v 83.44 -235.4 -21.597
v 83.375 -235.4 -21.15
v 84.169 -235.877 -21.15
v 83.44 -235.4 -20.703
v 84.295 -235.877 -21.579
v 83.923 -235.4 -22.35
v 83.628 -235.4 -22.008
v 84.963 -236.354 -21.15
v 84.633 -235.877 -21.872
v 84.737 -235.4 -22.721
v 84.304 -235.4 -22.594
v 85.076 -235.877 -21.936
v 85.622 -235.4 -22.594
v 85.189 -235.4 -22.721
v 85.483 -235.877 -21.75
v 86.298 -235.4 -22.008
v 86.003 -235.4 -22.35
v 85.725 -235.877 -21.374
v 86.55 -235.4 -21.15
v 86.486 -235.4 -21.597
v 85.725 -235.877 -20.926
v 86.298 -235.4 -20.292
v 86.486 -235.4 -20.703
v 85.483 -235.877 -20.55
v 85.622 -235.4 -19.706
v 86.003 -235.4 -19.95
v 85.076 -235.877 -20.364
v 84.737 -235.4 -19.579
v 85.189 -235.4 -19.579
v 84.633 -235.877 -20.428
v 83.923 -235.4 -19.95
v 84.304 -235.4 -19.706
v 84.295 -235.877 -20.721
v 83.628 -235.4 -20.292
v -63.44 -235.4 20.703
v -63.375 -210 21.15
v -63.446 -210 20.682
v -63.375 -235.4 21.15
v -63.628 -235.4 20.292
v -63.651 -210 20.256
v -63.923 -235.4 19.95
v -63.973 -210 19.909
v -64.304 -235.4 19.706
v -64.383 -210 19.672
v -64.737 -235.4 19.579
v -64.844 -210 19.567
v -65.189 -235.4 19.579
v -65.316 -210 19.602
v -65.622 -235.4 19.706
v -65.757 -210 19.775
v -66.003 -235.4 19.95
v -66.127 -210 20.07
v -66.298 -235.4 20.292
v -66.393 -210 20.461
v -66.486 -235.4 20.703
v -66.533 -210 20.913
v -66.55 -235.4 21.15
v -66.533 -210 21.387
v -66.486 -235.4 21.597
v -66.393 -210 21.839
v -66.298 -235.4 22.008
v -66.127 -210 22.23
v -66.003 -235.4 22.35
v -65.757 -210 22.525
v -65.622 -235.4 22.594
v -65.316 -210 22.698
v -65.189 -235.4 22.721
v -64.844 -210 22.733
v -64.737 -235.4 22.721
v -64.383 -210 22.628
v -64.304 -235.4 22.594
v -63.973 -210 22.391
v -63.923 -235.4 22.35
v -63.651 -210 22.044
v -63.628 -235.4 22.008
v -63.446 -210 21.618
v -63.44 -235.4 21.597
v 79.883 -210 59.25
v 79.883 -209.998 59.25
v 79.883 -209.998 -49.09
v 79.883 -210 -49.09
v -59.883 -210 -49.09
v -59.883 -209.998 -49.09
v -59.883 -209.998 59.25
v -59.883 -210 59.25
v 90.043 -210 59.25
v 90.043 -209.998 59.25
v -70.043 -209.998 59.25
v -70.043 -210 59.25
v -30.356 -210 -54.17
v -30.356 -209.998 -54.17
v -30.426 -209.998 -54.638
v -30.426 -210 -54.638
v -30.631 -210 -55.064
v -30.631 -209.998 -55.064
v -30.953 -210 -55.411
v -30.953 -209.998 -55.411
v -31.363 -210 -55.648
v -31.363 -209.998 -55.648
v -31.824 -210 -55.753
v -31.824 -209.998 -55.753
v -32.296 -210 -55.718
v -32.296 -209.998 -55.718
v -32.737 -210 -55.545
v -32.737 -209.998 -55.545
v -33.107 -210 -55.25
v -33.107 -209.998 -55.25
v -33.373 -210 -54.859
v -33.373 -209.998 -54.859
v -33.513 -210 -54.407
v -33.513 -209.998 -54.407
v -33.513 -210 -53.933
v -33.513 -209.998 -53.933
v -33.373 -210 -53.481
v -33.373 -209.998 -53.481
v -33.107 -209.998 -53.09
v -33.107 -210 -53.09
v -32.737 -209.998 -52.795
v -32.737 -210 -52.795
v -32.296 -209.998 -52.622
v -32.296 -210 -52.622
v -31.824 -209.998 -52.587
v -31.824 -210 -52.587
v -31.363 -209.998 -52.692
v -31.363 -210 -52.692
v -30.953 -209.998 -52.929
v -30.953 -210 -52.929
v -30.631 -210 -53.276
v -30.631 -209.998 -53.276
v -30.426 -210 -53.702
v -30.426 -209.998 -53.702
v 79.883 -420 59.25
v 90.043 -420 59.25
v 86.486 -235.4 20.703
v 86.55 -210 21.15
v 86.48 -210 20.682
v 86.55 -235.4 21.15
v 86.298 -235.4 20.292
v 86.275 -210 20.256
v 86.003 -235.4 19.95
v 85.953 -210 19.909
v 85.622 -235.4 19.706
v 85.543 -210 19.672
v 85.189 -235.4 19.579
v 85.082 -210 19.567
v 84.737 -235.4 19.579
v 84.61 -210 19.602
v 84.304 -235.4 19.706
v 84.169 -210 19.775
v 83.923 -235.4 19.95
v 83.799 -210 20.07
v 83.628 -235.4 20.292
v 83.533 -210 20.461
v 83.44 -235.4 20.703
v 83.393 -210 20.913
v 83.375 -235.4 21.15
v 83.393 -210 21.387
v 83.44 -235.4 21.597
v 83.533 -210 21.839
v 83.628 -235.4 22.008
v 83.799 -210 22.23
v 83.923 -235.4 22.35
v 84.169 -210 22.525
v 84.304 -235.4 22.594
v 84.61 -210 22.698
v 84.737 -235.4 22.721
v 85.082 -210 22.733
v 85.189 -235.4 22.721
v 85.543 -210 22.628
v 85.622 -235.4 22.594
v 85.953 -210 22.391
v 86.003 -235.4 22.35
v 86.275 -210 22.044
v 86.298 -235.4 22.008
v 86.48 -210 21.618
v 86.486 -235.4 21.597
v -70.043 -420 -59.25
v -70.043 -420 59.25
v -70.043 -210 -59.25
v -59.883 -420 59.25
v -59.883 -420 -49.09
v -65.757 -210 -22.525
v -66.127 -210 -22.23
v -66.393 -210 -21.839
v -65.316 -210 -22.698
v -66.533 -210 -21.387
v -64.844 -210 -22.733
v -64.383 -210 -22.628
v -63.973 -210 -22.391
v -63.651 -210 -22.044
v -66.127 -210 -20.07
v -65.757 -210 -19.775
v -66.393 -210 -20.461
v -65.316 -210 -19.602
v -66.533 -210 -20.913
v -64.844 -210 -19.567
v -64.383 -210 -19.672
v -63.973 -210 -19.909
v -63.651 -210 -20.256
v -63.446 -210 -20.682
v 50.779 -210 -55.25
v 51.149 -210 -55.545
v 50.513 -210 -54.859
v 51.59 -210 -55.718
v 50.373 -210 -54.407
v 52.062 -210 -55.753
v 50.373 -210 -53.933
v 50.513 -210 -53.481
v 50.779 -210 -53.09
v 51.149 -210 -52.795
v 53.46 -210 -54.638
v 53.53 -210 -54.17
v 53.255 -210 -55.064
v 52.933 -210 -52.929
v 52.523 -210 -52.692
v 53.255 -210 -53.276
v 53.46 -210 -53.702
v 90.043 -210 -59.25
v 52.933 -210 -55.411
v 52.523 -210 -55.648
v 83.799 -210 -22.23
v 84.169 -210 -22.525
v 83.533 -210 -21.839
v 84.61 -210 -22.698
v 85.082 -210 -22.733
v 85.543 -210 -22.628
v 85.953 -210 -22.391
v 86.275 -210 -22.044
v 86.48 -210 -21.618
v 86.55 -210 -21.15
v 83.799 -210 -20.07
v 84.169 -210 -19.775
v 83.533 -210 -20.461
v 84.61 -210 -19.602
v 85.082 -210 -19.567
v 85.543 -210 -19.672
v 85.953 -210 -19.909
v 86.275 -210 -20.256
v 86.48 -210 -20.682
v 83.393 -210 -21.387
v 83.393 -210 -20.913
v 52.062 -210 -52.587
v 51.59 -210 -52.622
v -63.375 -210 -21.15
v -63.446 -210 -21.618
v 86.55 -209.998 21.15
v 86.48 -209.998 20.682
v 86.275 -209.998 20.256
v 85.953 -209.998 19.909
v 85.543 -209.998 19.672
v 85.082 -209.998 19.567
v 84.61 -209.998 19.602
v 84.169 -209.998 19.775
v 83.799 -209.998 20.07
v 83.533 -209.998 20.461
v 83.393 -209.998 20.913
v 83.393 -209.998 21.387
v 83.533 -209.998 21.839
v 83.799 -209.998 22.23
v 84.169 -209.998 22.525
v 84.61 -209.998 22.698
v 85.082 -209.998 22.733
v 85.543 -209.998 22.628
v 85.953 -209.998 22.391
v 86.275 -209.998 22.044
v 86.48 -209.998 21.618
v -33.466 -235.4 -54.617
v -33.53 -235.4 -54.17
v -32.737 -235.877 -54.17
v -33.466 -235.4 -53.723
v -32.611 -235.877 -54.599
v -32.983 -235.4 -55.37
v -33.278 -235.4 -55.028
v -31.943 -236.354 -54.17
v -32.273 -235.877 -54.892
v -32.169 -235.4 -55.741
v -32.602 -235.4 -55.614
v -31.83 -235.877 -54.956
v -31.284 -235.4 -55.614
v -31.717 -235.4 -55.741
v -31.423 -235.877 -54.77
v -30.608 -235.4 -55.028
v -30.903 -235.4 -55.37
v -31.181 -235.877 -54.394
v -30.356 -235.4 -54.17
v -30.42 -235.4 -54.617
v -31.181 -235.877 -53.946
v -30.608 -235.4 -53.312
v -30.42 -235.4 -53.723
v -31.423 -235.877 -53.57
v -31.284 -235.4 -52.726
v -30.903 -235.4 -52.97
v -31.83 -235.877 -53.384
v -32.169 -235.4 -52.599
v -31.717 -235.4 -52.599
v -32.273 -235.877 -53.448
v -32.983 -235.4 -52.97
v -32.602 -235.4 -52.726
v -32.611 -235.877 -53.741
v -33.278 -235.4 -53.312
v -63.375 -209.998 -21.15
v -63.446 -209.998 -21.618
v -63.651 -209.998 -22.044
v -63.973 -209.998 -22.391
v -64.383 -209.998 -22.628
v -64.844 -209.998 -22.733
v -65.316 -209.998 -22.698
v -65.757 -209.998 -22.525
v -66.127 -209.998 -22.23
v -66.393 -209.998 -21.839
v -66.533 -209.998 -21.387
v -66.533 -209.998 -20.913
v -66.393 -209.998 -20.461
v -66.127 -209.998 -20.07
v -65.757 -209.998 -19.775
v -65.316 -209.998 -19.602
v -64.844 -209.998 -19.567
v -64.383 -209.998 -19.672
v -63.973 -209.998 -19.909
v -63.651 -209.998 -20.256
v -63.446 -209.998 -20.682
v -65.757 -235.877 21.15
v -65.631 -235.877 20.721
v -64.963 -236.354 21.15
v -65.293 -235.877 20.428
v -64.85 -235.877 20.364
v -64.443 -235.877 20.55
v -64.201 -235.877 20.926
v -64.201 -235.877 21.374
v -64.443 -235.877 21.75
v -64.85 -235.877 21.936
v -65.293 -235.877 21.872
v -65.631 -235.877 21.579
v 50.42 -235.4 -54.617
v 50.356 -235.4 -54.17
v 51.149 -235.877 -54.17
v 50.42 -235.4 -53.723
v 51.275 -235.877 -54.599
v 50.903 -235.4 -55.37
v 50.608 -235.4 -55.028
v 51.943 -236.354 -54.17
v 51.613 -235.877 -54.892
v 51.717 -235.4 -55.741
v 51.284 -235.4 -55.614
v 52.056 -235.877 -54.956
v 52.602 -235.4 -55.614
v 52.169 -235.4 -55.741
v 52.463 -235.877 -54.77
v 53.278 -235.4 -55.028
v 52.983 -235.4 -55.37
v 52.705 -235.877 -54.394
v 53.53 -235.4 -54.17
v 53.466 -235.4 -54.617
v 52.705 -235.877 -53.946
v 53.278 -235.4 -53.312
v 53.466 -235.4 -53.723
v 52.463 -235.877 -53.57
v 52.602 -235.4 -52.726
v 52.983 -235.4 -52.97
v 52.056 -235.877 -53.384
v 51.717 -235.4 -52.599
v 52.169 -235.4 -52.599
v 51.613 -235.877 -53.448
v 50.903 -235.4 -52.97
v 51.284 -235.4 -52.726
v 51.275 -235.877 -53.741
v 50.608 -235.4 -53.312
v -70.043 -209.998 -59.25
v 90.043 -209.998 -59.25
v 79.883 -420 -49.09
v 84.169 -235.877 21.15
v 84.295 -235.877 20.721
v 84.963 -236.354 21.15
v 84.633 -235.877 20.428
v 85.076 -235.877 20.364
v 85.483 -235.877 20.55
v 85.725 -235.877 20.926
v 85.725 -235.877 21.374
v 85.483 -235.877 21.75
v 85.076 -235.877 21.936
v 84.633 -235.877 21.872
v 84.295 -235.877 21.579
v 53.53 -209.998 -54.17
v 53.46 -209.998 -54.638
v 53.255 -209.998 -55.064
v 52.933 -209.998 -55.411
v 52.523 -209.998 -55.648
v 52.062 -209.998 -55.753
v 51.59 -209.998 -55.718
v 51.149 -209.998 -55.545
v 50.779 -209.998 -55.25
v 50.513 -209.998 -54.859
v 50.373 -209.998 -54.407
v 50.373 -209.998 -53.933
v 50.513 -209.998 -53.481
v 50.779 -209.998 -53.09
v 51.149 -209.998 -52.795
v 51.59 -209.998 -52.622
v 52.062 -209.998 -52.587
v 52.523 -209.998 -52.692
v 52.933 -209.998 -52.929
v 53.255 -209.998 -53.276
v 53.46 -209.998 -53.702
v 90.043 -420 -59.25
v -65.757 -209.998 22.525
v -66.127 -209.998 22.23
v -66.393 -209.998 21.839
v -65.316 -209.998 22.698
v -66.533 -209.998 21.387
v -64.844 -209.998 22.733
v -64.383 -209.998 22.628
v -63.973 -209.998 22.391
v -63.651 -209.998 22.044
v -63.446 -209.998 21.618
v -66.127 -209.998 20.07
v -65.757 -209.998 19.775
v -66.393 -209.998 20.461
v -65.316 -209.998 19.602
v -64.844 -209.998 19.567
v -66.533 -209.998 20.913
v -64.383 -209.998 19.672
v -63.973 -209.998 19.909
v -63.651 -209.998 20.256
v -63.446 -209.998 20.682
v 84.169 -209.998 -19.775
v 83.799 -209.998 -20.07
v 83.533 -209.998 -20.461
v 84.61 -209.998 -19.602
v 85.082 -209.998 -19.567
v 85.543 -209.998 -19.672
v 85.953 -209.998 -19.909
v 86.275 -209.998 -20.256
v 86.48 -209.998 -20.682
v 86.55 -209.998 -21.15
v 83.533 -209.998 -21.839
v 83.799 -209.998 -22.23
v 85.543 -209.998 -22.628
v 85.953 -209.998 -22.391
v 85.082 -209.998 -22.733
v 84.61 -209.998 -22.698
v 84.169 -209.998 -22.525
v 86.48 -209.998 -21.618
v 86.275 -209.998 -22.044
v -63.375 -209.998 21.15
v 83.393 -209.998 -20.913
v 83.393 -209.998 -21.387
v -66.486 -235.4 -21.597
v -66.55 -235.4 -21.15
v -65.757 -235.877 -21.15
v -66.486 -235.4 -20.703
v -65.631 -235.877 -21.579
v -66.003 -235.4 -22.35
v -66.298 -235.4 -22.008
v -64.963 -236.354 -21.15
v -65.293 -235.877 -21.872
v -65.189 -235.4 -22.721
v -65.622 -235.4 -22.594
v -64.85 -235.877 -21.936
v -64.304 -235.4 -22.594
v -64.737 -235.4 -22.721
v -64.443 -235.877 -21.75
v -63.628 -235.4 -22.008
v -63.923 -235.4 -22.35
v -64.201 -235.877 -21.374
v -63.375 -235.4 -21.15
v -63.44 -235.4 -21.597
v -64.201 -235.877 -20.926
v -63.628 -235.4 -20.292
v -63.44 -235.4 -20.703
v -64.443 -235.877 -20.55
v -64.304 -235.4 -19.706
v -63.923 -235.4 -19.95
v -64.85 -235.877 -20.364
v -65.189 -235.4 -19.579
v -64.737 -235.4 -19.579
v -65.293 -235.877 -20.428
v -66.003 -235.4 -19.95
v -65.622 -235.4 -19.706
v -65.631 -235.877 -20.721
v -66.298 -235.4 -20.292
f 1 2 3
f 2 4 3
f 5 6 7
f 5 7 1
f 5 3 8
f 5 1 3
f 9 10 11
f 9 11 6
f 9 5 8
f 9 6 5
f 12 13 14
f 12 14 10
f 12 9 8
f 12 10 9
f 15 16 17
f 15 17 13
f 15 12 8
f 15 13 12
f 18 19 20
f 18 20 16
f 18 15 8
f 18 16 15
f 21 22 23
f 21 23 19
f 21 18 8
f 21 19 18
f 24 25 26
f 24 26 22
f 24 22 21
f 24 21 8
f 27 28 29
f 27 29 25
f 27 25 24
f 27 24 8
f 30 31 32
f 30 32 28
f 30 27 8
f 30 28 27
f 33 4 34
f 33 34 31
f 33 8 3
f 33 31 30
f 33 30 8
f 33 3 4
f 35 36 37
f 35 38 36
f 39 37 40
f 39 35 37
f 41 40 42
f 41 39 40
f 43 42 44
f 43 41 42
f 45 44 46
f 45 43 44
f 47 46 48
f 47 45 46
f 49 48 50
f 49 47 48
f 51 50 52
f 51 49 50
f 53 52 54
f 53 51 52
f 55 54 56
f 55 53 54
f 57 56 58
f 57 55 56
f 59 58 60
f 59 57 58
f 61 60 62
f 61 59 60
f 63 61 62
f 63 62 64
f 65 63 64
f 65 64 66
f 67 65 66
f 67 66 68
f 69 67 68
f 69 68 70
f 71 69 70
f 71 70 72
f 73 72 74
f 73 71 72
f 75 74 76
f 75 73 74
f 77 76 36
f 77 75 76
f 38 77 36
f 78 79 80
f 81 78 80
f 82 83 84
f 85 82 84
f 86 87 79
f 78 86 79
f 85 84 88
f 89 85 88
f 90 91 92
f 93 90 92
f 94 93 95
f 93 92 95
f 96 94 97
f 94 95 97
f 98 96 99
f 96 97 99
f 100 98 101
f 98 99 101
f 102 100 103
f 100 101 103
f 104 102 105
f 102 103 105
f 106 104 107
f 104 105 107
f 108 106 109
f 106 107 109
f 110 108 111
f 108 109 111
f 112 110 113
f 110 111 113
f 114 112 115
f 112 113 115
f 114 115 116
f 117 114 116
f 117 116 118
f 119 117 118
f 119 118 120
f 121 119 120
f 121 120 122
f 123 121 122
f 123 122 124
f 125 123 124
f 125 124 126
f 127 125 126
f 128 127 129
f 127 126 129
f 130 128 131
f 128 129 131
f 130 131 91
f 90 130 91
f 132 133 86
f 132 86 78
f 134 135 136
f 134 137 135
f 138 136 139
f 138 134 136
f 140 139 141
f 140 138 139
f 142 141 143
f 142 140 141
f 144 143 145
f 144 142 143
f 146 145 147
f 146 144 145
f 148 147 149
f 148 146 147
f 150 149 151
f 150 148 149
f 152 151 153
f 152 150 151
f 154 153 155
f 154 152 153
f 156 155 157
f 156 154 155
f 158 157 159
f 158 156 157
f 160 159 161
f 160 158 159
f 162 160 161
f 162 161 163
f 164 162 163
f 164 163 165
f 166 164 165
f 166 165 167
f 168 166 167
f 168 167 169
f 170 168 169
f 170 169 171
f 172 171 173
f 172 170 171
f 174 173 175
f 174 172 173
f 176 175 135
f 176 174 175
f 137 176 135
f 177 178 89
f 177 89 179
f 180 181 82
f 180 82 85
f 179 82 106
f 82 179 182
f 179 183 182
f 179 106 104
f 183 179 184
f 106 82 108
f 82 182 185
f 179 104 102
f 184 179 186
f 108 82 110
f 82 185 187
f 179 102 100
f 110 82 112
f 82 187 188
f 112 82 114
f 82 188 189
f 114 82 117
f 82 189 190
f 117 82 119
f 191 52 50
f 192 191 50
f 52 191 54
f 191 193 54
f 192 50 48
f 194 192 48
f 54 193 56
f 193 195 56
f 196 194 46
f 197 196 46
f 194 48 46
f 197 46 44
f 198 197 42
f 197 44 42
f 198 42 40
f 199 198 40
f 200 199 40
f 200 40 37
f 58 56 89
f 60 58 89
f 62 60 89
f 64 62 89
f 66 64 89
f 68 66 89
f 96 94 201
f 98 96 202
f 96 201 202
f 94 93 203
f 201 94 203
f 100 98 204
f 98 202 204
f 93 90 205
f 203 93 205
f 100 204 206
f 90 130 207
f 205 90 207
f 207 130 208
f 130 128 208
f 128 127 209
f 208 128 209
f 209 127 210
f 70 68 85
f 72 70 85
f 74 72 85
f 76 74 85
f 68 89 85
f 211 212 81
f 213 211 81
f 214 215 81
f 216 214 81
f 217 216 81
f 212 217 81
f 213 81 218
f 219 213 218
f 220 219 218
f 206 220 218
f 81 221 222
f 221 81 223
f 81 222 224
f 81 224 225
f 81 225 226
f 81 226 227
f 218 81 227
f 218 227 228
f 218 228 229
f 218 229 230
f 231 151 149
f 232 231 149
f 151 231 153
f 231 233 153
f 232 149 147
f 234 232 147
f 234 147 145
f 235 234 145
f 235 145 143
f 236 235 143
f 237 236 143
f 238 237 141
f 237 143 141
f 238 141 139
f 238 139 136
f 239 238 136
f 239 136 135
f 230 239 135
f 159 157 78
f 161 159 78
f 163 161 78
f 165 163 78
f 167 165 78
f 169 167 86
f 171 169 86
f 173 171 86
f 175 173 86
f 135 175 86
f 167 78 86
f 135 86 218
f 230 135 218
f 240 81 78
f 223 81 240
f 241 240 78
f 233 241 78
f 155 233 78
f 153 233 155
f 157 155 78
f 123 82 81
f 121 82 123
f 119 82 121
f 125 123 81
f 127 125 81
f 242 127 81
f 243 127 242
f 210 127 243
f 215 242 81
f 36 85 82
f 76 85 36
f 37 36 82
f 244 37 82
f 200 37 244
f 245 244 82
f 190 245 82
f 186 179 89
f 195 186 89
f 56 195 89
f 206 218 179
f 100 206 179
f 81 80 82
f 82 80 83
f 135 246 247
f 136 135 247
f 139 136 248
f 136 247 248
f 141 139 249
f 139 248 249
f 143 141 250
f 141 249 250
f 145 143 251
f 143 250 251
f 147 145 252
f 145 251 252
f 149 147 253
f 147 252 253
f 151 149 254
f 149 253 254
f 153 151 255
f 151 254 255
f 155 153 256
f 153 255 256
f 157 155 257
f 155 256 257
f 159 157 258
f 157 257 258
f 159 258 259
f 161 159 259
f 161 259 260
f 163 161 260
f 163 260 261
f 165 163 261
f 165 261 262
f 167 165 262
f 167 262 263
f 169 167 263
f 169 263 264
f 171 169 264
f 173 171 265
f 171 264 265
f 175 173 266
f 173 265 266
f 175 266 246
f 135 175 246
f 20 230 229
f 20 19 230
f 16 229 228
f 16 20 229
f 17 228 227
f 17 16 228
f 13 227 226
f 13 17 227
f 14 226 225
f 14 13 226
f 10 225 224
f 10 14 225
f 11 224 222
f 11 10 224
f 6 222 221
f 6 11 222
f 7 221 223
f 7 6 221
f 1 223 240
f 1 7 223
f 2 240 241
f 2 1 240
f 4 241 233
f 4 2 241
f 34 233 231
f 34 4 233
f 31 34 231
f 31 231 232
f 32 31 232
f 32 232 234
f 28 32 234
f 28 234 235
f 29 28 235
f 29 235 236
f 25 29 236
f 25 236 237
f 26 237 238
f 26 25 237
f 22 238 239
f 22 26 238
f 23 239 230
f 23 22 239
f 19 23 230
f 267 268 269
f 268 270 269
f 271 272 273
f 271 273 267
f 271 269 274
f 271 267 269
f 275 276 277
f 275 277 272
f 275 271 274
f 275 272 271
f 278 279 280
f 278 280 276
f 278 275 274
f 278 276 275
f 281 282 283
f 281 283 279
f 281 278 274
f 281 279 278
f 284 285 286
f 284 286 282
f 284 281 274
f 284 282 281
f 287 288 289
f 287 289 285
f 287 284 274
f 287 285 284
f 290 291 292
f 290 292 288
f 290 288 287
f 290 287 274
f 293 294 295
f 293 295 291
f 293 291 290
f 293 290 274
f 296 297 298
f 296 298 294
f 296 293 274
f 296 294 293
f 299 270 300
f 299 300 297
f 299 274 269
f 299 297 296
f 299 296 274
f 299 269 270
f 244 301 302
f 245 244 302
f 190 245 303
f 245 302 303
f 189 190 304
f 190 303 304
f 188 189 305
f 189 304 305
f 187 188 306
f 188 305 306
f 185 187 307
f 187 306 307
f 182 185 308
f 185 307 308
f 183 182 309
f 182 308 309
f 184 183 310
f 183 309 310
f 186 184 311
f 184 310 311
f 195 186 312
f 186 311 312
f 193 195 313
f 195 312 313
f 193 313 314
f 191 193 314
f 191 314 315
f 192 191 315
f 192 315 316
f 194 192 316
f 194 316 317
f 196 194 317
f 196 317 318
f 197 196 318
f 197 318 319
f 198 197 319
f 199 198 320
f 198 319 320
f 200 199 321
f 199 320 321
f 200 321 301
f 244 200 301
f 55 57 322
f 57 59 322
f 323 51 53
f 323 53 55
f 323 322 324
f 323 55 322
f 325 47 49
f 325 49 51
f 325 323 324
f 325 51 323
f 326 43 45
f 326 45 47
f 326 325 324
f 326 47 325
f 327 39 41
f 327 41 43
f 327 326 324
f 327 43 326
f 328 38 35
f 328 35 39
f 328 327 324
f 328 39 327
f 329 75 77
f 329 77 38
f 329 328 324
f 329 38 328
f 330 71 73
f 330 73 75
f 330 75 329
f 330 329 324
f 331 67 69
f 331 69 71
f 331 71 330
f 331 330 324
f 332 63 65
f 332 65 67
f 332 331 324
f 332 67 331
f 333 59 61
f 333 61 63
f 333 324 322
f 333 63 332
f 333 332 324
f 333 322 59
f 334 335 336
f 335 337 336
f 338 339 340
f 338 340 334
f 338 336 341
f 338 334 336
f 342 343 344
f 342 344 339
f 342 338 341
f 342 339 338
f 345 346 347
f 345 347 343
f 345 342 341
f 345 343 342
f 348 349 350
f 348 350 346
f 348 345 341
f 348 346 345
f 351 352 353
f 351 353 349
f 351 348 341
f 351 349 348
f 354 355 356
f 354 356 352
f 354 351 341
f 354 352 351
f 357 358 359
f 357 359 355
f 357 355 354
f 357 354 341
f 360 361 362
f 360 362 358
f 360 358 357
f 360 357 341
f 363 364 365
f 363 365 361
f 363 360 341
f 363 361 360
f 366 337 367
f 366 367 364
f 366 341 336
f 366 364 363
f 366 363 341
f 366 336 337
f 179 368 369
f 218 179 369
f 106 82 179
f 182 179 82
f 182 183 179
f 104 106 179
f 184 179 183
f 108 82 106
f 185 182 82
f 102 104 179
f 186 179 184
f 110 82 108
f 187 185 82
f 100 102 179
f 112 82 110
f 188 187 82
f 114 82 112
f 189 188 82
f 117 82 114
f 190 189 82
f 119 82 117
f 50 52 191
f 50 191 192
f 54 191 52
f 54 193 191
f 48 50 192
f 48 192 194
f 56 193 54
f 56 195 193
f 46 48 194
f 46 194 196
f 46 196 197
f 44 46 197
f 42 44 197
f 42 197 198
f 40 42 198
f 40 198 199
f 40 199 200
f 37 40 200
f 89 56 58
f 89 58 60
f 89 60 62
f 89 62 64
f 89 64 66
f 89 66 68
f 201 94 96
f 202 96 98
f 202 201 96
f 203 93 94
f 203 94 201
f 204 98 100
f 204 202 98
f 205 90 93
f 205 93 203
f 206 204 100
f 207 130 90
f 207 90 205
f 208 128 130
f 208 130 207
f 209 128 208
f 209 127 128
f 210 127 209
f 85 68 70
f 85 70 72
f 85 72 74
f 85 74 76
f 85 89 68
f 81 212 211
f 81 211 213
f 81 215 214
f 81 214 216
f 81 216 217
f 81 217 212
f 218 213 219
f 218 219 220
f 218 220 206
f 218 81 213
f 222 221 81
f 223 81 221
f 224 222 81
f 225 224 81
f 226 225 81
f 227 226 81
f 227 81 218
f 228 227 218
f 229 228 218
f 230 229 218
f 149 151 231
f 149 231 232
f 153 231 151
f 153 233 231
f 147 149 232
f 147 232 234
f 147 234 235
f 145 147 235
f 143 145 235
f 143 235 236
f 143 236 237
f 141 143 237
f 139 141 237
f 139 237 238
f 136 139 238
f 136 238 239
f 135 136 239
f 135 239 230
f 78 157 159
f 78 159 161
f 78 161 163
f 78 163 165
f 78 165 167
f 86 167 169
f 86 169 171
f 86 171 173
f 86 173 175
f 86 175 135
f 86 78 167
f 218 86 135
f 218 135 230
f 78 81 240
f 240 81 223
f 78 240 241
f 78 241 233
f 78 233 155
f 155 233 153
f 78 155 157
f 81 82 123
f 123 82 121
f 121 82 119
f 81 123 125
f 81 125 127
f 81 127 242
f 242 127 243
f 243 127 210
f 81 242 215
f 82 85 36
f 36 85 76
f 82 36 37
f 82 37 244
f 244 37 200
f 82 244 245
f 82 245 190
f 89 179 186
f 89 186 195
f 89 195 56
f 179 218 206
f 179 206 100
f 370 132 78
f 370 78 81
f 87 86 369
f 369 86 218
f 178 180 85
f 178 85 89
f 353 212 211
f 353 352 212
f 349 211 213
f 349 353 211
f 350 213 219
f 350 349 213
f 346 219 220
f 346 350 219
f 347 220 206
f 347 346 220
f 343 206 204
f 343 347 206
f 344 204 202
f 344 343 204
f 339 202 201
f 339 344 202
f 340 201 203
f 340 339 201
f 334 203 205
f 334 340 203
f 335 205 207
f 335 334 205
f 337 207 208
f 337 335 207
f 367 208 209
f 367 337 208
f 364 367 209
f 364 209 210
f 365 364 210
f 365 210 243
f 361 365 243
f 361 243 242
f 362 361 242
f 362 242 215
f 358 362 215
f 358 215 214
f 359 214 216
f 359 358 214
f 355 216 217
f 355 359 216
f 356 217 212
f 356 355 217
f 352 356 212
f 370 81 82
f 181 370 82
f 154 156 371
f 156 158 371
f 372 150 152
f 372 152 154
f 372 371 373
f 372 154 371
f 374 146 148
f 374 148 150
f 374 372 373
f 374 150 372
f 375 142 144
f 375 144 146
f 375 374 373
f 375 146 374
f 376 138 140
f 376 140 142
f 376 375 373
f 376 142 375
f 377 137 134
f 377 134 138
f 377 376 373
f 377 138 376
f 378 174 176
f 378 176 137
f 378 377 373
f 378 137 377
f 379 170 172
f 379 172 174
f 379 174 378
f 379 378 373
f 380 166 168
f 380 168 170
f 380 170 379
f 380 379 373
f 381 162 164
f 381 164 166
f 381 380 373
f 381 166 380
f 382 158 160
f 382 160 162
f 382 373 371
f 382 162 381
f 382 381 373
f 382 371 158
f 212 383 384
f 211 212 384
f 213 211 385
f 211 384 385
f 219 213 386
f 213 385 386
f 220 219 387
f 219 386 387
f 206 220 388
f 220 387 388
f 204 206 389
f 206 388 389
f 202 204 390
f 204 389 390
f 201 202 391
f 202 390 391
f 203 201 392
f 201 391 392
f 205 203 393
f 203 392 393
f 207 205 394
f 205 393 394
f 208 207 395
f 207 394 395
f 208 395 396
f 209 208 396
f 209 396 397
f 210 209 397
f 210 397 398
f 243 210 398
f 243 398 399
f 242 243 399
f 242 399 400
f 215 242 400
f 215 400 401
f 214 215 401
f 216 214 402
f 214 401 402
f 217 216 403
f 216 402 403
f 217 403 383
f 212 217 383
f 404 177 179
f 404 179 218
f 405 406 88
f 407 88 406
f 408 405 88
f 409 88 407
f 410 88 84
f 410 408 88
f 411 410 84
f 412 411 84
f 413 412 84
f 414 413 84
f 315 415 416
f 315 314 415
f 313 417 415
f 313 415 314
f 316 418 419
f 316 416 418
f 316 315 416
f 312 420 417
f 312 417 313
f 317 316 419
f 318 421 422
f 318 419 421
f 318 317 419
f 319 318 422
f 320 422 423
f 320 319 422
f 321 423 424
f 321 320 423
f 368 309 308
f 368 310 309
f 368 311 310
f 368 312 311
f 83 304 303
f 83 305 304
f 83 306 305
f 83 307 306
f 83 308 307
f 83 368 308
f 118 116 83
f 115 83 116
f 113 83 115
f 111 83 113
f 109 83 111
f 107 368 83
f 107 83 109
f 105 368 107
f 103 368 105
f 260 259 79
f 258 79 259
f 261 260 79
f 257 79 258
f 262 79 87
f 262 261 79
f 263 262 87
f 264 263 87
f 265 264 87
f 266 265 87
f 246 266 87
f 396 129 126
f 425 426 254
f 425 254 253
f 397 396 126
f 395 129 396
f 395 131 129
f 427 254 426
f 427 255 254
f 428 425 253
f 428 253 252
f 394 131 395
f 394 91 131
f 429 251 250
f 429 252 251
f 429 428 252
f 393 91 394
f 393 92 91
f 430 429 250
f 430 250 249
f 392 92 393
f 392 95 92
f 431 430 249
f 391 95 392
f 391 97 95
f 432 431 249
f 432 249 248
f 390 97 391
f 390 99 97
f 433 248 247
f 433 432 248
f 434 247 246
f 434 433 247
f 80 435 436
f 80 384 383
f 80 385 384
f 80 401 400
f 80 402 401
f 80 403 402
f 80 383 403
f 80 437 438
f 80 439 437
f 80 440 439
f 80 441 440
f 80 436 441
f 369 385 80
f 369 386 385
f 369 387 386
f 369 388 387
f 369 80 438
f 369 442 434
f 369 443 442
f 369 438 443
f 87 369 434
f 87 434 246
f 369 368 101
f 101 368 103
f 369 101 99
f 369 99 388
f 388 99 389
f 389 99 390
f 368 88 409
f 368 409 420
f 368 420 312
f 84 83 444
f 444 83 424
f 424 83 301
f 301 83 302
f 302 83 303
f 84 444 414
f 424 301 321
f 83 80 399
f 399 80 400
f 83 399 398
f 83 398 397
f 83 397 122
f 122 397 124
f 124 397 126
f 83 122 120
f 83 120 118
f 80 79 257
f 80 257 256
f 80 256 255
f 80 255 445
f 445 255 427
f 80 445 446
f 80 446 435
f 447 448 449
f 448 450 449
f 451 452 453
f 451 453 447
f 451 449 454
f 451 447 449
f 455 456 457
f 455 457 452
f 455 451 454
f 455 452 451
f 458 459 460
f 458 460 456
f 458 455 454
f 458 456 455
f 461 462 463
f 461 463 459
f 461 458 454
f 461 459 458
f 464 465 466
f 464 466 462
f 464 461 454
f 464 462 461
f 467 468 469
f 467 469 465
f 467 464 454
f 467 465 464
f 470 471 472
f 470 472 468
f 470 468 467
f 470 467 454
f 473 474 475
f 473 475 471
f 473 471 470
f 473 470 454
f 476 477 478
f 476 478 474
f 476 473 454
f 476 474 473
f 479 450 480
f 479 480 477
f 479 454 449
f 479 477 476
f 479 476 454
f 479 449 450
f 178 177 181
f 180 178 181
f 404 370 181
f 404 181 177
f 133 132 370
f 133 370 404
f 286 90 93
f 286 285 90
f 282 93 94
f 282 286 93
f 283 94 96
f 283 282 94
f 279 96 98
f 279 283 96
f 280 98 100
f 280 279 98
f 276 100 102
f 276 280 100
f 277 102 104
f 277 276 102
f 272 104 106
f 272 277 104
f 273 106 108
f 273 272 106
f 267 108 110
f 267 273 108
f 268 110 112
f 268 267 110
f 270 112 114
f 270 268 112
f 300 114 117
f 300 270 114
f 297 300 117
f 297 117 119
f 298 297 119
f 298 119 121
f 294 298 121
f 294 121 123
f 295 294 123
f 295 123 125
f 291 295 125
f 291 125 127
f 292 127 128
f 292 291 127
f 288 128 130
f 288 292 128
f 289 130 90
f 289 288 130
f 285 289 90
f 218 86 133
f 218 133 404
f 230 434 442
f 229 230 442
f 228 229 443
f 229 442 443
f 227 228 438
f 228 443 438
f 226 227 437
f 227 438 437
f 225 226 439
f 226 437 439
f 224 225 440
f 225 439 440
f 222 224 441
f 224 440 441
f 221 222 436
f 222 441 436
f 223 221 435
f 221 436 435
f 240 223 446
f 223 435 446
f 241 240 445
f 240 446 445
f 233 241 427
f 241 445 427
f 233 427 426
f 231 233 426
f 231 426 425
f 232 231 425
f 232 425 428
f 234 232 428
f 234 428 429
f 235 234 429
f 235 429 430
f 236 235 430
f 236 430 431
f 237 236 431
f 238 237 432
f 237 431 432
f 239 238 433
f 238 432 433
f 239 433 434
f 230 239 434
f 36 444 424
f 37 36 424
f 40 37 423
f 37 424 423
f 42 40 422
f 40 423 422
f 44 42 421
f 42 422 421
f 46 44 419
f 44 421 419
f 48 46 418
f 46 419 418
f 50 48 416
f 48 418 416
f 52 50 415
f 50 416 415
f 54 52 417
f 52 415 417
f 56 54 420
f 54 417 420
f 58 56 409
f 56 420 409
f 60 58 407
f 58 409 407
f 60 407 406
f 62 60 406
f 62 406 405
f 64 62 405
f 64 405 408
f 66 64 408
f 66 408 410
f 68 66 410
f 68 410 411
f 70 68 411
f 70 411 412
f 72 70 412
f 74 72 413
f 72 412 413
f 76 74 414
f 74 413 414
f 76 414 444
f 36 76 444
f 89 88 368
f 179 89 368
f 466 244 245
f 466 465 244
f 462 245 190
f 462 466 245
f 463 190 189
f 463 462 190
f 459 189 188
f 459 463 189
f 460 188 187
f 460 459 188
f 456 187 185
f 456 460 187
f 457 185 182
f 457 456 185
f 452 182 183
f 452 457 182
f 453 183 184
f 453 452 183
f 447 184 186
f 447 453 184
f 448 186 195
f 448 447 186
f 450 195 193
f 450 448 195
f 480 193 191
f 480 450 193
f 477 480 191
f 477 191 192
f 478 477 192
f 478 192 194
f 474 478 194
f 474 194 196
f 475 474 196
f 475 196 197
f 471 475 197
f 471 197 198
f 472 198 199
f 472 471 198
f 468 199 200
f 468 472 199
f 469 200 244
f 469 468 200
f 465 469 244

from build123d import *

# Parameters (mm, degrees)
SKETCH1_W                      = 180.086
SKETCH1_H                      = 165.1
BOSS_EXTRUDE1_DEPTH            = 3.302
M5_CLEARANCE_HOLE2_D           = 5.5
M5_CLEARANCE_HOLE2_DEPTH       = 3.302
FILLET1_R                      = 3.302
BOSS_EXTRUDE2_DEPTH            = 210
F_1_8_0_1250_DOWEL_HOLE1_D     = 3.175
F_1_8_0_1250_DOWEL_HOLE1_DEPTH = 25.4
F_1_8_0_1250_DOWEL_HOLE1_TIP   = 0.953866233
SKETCH25_W                     = 202.106165301
SKETCH25_H                     = 177.594943489
CUT_EXTRUDE1_DEPTH             = 213.3
SKETCH26_W                     = 189.404895816
SKETCH26_H                     = 174.029674862
CUT_EXTRUDE3_DEPTH             = 3.302


with BuildPart() as part:
    # Sketch1 → Boss-Extrude1 (new body)
    with BuildSketch(Plane(origin=(0, 0, 0), x_dir=(1, 0, 0), z_dir=(0, 1, 0))):
        Rectangle(SKETCH1_W, SKETCH1_H)
    extrude(amount=BOSS_EXTRUDE1_DEPTH)

    # M5 Clearance Hole2
    with Locations(Plane(origin=(0, 3.302, 0), x_dir=(1, 0, 0), z_dir=(0, 1, 0))):
        with Locations((51.943, -72.39), (-51.943, -72.39), (51.943, 72.39), (-51.943, 72.39)):
            Hole(M5_CLEARANCE_HOLE2_D / 2, depth=M5_CLEARANCE_HOLE2_DEPTH)

    # Fillet1
    fillet1_edges = [part.edges().sort_by_distance(p)[0] for p in [
        (90.043, 1.651, 82.55),
        (-90.043, 1.651, 82.55),
        (-90.043, 1.651, -82.55),
        (90.043, 1.651, -82.55),
    ]]
    fillet(fillet1_edges, radius=FILLET1_R)

    # Sketch12 → Boss-Extrude2 (add)
    with BuildSketch(Plane.XZ):
        Polygon((90.043, -59.25), (90.043, 59.25), (79.883, 59.25), (79.883, -49.09), (-59.883, -49.09), (-59.883, 59.25), (-70.043, 59.25), (-70.043, -59.25), align=None)
    extrude(amount=BOSS_EXTRUDE2_DEPTH)

    # 1/8 (0.1250) Dowel Hole1
    with Locations(Plane(origin=(0, -210, 0), x_dir=(-1, 0, 0), z_dir=(0, -1, 0))):
        with Locations((64.963, -21.15), (64.963, 21.15), (31.943, 54.17), (-51.943, 54.17), (-84.963, 21.15), (-84.963, -21.15)):
            Hole(F_1_8_0_1250_DOWEL_HOLE1_D / 2, depth=F_1_8_0_1250_DOWEL_HOLE1_DEPTH)
            with Locations((0, 0, -(F_1_8_0_1250_DOWEL_HOLE1_DEPTH + F_1_8_0_1250_DOWEL_HOLE1_TIP / 2))):  # 118° drill point
                Cone(0, F_1_8_0_1250_DOWEL_HOLE1_D / 2, F_1_8_0_1250_DOWEL_HOLE1_TIP, mode=Mode.SUBTRACT)


with BuildPart() as body_2:
    # Mirror1: mirrored copy
    add(part.part.mirror(Plane(origin=(0, -210, 0), x_dir=(0, 0, 1), z_dir=(0, -1, 0))))

    # Sketch26 → Cut-Extrude3 (cut)
    with BuildSketch(Plane.XZ.offset(423.302)):
        with Locations((0, -0.222829289)):
            Rectangle(SKETCH26_W, SKETCH26_H)
    extrude(amount=-CUT_EXTRUDE3_DEPTH, mode=Mode.SUBTRACT)


with BuildPart() as part_1:
    add(part.part)

    # Sketch25 → Cut-Extrude1 (cut)
    with BuildSketch(Plane(origin=(0, 3.302, 0), x_dir=(1, 0, 0), z_dir=(0, 1, 0))):
        with Locations((0.111414645, -1.559805025)):
            Rectangle(SKETCH25_W, SKETCH25_H)
    extrude(amount=-CUT_EXTRUDE1_DEPTH, mode=Mode.SUBTRACT)


solid = Compound([body_2.part, part_1.part])
